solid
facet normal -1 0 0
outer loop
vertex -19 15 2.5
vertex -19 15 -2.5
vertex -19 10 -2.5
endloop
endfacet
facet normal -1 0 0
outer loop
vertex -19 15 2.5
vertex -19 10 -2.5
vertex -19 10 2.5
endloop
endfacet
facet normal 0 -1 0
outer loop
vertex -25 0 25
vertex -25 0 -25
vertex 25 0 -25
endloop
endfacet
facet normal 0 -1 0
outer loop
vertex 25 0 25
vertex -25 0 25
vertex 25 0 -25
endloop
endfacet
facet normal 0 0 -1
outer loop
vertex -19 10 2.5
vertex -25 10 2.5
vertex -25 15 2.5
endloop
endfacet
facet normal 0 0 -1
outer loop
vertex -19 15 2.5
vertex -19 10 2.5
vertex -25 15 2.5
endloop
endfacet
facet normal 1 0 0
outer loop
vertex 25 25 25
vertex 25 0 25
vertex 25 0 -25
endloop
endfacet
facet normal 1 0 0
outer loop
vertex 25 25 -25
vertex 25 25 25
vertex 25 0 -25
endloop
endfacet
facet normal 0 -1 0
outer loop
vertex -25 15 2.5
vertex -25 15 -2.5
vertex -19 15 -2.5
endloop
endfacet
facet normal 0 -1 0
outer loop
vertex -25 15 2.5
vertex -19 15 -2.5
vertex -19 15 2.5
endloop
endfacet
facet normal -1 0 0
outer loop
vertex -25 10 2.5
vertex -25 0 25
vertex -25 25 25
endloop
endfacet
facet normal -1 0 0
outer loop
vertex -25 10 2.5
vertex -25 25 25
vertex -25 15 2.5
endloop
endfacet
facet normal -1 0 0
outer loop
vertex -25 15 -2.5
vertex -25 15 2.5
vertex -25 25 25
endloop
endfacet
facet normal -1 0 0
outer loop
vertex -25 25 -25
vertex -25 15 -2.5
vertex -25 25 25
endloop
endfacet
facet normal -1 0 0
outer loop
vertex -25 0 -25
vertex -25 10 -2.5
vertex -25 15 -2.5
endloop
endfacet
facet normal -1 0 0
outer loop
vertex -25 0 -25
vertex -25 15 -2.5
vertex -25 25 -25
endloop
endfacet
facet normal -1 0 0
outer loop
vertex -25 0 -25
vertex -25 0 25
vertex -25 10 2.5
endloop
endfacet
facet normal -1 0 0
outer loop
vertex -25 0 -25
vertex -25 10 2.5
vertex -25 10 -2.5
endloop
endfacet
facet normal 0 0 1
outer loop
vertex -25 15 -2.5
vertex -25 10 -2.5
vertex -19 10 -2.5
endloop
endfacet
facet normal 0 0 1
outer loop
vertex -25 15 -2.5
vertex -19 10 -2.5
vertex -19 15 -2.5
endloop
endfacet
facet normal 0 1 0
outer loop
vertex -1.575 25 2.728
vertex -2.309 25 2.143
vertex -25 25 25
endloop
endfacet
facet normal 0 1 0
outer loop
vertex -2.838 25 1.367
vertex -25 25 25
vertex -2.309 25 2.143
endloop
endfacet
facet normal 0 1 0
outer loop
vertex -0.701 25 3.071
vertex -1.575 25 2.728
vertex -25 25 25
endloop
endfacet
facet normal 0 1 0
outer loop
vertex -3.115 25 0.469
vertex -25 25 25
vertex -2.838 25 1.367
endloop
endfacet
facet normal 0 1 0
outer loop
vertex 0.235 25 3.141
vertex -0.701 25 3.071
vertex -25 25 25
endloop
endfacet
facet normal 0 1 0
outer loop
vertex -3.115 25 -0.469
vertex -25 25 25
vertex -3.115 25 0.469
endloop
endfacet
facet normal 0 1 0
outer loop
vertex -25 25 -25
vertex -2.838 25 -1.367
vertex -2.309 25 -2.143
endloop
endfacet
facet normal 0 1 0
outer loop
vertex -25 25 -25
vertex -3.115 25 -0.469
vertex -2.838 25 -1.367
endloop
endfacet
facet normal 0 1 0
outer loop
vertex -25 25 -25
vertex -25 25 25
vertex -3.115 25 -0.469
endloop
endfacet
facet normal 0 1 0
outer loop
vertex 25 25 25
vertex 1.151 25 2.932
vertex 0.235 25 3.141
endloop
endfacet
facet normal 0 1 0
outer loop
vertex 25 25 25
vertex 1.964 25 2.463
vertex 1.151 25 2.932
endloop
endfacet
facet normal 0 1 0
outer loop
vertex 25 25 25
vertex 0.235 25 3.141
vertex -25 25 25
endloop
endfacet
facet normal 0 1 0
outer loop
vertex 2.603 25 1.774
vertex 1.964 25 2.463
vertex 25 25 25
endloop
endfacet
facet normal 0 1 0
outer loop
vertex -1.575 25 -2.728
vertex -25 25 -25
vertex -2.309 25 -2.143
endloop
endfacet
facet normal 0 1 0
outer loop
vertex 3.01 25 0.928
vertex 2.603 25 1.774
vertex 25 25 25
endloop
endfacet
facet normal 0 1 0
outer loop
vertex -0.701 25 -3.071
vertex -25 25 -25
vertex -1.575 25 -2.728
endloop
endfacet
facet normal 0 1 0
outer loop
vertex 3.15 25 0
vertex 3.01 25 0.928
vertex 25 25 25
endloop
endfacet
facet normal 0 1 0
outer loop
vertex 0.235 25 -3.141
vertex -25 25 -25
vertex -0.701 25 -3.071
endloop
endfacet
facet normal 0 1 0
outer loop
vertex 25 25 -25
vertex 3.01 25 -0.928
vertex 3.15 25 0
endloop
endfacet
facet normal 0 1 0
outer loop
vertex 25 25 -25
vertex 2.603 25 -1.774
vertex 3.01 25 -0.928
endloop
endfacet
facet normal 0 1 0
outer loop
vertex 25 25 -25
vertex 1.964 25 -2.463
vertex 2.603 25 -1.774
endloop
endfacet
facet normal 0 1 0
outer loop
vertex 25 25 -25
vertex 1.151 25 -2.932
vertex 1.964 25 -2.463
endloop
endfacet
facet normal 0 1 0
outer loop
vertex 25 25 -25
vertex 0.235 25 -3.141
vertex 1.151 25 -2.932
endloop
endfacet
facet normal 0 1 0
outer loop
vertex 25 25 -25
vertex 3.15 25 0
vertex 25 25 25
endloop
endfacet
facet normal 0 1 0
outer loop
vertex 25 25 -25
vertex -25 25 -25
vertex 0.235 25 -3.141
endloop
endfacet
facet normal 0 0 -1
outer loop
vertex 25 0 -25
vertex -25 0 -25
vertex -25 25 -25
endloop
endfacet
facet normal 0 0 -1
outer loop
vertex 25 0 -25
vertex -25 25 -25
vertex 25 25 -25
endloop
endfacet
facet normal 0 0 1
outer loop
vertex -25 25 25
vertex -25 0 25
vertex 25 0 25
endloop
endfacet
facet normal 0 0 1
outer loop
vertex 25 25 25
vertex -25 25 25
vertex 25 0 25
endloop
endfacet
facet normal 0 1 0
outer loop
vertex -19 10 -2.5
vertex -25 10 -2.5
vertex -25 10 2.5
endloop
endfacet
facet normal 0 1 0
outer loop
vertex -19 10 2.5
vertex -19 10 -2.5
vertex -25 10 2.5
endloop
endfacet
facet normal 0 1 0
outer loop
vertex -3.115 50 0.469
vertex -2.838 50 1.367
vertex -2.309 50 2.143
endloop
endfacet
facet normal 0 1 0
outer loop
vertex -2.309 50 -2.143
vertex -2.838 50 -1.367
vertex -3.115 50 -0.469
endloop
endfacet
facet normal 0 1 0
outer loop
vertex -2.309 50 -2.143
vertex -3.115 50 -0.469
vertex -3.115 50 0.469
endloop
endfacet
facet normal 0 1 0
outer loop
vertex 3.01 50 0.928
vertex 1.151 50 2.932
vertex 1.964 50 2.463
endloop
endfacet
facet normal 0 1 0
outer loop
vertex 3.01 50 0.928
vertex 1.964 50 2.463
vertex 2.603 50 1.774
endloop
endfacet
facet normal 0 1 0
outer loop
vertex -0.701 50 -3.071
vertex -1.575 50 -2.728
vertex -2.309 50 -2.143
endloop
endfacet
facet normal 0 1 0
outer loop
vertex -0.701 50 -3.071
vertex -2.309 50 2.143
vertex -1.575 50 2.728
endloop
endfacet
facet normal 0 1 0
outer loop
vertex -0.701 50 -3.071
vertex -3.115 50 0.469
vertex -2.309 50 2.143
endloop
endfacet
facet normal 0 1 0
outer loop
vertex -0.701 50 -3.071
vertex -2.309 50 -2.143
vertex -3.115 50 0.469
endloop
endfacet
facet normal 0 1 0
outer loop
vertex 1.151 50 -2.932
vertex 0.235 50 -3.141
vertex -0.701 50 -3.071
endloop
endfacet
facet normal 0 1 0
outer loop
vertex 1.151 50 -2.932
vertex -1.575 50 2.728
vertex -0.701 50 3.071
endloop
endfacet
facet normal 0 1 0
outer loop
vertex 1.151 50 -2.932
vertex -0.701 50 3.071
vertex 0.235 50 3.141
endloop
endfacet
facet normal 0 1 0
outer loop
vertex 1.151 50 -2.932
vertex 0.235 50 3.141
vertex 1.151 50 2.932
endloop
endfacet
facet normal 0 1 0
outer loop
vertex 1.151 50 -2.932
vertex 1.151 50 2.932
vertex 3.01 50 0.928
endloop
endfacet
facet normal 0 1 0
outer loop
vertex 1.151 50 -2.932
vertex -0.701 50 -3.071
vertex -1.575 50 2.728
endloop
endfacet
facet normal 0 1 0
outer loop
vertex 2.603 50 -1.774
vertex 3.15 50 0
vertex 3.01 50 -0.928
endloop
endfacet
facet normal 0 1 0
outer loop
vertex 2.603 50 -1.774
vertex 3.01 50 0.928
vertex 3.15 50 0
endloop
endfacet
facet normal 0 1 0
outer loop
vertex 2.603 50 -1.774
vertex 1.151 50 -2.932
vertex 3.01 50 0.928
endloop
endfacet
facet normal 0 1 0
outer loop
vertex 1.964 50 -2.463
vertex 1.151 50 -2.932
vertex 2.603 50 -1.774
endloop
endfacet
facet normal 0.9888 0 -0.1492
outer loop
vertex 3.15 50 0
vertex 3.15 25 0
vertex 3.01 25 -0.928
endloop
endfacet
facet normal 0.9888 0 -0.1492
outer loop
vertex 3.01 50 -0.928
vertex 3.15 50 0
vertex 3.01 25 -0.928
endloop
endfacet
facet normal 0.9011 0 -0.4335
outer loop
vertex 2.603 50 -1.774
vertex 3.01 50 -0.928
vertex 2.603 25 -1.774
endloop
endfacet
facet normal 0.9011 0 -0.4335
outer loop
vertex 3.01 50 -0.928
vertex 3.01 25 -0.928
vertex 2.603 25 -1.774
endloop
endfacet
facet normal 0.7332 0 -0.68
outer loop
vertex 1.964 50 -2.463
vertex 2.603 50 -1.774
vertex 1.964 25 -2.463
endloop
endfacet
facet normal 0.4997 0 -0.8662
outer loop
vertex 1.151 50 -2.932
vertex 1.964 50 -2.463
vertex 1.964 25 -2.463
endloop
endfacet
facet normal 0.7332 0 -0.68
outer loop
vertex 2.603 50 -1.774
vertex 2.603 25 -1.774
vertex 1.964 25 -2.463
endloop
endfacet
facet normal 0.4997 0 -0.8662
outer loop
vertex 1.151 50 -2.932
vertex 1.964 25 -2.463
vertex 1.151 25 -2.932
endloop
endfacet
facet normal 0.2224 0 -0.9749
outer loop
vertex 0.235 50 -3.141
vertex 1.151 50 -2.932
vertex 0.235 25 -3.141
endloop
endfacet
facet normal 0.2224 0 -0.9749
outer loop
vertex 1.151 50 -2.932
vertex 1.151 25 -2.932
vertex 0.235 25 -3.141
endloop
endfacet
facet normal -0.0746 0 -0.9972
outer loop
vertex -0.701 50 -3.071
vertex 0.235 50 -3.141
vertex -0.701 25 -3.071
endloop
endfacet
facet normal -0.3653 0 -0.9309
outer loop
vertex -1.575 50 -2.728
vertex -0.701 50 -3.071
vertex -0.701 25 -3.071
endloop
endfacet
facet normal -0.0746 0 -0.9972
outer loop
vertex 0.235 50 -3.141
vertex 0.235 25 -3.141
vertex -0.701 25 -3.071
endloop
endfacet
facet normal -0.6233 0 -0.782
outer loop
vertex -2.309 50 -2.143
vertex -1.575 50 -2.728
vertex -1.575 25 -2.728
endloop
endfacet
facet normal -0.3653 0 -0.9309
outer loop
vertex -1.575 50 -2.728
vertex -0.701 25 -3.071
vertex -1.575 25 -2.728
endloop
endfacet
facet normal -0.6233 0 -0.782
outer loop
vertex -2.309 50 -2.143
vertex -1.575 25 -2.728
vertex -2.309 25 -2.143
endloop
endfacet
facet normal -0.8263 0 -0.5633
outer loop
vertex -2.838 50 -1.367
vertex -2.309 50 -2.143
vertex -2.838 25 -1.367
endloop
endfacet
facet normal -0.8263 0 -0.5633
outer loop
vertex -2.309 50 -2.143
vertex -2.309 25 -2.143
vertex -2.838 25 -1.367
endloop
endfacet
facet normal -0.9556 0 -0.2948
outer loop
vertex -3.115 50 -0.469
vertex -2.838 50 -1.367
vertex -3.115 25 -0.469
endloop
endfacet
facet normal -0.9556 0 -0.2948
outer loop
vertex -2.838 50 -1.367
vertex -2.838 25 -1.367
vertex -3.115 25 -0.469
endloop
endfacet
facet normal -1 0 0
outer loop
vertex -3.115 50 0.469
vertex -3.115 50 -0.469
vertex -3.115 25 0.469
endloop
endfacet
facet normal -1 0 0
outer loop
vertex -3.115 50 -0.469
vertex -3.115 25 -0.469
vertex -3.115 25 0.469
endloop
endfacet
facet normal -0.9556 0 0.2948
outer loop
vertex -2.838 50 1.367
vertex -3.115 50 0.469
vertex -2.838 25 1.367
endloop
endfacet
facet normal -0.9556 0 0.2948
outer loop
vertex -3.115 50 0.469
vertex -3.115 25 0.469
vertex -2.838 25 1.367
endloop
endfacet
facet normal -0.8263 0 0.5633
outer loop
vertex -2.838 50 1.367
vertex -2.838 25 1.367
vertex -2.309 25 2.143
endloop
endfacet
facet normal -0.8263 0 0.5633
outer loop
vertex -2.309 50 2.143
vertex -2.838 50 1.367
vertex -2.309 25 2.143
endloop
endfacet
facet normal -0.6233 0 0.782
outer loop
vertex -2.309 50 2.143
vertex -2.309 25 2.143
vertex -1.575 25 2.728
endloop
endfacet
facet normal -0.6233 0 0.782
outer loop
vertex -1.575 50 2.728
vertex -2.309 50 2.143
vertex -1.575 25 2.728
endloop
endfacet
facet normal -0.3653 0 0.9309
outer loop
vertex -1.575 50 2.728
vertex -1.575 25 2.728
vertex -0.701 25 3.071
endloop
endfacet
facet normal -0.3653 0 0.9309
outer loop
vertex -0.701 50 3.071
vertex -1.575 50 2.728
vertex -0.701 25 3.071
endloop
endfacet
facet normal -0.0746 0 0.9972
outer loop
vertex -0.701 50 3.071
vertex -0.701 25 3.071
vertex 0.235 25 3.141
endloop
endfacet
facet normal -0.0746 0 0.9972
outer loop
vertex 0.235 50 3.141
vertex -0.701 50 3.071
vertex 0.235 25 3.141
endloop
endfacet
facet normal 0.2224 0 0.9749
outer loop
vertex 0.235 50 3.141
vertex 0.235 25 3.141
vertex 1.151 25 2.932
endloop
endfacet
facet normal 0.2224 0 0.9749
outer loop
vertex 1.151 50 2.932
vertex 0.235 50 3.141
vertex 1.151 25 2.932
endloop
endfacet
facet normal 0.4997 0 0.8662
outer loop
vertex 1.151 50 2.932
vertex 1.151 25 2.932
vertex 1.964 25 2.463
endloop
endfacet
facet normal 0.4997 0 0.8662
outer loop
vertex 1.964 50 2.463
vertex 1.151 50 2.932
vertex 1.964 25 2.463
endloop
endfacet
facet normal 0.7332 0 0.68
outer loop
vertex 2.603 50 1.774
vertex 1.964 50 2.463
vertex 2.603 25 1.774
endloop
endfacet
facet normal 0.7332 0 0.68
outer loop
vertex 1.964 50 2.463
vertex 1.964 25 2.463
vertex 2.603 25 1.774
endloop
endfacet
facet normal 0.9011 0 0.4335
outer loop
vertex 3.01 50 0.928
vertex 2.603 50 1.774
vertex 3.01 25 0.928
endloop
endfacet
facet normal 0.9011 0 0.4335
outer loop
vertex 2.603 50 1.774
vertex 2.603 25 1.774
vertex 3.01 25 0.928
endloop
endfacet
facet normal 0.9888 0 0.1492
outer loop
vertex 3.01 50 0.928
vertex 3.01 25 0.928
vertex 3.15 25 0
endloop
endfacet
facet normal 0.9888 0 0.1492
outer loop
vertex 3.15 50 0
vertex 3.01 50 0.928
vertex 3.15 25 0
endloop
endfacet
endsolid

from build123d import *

# Parameters (mm, degrees)
SKETCH1_W           = 50
SKETCH1_H           = 50
BOSS_EXTRUDE1_DEPTH = 25
SKETCH2_R           = 3.15
BOSS_EXTRUDE2_DEPTH = 25
SKETCH3_W           = 5
SKETCH3_H           = 5
CUT_EXTRUDE2_DEPTH  = 6


with BuildPart() as part:
    # Sketch1 → Boss-Extrude1 (new body)
    with BuildSketch(Plane(origin=(0, 0, 0), x_dir=(1, 0, 0), z_dir=(0, 1, 0))):
        Rectangle(SKETCH1_W, SKETCH1_H)
    extrude(amount=BOSS_EXTRUDE1_DEPTH)

    # Sketch2 → Boss-Extrude2 (add)
    with BuildSketch(Plane(origin=(0, 25, 0), x_dir=(1, 0, 0), z_dir=(0, 1, 0))):
        Circle(SKETCH2_R)
    extrude(amount=BOSS_EXTRUDE2_DEPTH)

    # Sketch3 → Cut-Extrude2 (cut)
    with BuildSketch(Plane.ZY.offset(25)):
        with Locations((0, 12.5)):
            Rectangle(SKETCH3_W, SKETCH3_H)
    extrude(amount=-CUT_EXTRUDE2_DEPTH, mode=Mode.SUBTRACT)


solid = part.part
